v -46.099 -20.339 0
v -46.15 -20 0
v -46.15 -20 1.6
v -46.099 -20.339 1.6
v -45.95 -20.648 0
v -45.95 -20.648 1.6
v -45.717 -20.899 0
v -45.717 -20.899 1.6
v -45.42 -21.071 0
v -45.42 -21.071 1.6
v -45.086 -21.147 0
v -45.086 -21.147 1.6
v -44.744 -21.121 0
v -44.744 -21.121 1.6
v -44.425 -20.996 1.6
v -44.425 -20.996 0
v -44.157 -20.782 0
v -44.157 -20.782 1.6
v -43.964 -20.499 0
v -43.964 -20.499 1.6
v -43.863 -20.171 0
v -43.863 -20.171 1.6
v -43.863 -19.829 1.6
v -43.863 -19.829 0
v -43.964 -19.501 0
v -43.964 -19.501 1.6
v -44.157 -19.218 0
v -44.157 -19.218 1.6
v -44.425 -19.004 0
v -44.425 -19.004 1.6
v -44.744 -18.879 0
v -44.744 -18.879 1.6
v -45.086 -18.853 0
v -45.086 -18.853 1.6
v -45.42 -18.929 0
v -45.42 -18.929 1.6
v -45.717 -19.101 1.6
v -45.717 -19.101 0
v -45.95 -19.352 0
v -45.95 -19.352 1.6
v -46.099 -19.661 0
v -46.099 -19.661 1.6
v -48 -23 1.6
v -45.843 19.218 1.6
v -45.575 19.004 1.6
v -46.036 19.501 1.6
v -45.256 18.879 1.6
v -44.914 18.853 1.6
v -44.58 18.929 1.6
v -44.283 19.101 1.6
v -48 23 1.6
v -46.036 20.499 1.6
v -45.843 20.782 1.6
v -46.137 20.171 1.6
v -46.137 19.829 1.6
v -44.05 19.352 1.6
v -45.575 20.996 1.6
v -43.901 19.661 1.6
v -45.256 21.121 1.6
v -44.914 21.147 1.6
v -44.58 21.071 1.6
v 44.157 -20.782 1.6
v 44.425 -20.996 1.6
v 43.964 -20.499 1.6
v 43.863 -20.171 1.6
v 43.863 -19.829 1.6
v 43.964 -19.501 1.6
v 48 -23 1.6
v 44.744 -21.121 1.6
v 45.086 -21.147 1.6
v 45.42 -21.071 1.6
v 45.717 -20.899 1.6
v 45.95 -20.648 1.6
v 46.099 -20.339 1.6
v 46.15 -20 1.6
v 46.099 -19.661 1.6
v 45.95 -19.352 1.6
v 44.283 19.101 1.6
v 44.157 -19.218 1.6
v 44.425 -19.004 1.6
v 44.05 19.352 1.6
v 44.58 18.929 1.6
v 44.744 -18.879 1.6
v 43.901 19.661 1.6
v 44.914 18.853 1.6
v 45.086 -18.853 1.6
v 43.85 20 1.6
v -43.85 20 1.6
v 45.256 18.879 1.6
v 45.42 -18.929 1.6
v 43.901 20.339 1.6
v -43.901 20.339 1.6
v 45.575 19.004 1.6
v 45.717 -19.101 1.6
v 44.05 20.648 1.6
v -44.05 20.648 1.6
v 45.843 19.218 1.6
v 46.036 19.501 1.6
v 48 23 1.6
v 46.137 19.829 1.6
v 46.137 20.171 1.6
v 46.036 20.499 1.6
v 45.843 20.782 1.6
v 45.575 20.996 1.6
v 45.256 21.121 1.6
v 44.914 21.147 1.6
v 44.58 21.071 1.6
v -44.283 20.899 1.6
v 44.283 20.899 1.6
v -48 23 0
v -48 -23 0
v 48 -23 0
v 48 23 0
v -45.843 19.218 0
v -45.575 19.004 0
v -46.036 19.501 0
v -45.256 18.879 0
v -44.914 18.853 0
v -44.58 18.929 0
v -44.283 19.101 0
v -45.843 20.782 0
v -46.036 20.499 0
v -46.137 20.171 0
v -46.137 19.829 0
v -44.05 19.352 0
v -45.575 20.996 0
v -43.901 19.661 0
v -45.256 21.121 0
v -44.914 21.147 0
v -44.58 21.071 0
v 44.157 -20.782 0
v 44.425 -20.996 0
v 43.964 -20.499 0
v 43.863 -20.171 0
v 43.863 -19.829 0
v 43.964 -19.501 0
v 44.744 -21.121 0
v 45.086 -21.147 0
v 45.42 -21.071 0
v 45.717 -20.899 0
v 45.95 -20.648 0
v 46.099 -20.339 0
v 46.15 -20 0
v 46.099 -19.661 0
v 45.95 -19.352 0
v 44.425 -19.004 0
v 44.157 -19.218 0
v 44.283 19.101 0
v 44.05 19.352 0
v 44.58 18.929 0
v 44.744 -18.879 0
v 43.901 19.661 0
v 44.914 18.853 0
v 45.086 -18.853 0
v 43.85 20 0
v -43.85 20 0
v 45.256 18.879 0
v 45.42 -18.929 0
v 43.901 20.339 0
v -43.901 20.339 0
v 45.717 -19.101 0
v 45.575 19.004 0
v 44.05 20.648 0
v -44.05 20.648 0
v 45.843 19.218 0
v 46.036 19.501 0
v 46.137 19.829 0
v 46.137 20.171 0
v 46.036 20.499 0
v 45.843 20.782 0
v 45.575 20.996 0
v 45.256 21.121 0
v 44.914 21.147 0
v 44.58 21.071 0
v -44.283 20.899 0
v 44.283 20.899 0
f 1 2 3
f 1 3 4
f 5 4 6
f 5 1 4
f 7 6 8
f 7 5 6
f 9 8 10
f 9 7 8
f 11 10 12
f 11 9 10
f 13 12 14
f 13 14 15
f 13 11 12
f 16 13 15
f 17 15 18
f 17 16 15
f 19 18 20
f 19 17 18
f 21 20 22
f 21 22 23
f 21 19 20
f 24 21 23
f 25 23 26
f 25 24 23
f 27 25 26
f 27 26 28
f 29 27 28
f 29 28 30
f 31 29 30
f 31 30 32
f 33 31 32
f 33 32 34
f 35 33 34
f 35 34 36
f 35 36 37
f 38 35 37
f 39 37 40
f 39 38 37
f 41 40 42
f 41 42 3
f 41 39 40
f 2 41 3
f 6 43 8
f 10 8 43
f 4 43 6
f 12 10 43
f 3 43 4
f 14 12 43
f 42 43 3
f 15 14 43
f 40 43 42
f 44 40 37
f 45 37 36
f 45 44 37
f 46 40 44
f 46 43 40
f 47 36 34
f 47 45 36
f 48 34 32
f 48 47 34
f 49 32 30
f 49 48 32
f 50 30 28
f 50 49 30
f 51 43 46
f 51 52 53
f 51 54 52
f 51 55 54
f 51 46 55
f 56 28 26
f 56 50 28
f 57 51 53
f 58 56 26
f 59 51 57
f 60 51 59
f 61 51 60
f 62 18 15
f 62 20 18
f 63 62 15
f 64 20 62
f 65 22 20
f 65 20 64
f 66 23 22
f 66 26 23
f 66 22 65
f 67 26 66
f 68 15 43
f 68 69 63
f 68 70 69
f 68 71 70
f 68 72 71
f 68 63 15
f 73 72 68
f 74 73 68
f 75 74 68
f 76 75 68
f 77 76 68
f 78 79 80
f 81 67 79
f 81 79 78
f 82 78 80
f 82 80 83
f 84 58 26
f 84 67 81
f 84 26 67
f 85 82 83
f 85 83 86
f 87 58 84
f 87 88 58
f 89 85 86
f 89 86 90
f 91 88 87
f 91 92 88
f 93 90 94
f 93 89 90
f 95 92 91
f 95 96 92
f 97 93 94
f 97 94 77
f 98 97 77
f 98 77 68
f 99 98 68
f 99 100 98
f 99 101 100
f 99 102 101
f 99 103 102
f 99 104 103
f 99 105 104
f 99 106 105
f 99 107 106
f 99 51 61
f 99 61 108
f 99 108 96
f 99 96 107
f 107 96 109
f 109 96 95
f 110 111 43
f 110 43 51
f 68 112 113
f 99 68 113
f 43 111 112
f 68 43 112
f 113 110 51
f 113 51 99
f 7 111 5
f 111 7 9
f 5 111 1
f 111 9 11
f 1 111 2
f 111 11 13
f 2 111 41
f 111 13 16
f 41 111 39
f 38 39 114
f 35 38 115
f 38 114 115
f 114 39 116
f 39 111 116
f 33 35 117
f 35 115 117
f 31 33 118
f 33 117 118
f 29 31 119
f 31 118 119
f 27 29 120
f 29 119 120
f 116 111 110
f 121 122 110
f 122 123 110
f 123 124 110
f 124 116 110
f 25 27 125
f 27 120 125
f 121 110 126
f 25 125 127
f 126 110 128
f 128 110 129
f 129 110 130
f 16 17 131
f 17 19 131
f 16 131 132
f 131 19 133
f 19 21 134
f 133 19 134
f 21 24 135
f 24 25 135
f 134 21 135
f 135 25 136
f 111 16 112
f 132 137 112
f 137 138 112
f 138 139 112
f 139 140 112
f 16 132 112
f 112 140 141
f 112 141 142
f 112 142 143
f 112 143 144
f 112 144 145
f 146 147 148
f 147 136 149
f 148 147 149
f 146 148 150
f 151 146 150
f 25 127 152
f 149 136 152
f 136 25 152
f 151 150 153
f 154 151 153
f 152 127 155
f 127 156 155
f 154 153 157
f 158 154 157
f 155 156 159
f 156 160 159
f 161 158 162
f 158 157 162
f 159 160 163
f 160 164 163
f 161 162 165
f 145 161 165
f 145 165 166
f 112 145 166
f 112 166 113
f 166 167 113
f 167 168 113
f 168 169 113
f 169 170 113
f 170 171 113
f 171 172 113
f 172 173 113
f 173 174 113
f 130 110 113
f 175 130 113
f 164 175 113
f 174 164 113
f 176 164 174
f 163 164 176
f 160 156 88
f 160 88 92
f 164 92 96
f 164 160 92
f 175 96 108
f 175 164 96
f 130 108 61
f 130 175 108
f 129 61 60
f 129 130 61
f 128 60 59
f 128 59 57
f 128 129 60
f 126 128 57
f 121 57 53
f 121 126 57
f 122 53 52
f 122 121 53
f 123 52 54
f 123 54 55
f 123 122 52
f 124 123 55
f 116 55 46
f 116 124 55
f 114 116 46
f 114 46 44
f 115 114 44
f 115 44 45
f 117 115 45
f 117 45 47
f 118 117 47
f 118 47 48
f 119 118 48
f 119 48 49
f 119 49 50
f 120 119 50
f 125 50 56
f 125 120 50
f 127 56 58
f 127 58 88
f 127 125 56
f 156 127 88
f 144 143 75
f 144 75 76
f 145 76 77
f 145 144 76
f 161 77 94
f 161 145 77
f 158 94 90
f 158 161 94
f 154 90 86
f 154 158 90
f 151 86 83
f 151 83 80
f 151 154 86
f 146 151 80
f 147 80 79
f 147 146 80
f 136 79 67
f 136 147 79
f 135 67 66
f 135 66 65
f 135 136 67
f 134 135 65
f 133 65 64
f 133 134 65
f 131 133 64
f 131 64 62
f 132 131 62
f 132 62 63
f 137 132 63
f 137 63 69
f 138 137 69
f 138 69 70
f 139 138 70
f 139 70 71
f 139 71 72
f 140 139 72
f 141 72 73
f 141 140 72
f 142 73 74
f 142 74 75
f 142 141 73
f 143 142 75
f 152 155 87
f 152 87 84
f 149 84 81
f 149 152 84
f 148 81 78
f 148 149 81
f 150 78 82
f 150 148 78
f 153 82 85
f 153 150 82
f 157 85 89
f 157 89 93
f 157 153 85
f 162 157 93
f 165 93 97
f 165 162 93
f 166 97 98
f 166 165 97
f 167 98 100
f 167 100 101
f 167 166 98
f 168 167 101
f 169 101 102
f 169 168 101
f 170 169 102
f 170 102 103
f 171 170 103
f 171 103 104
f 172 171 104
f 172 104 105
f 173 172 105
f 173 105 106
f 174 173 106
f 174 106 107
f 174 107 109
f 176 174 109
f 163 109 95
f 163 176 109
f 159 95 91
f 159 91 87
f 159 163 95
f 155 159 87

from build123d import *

# Parameters (mm, degrees)
ESQUISSE1_W        = 96
ESQUISSE1_H        = 46
ESQUISSE1_R        = 1.15
BOSS_EXTRU_1_DEPTH = 1.6


with BuildPart() as part:
    # Esquisse1 → Boss.-Extru.1 (new body)
    with BuildSketch(Plane.XY):
        Rectangle(ESQUISSE1_W, ESQUISSE1_H)
        with Locations((-45, 20)):
            Circle(ESQUISSE1_R, mode=Mode.SUBTRACT)
        with Locations(Location((45, 20, 0), (0, 0, 180))):
            Circle(ESQUISSE1_R, mode=Mode.SUBTRACT)
        with Locations(Location((-45, -20, 0), (0, 0, 180))):
            Circle(ESQUISSE1_R, mode=Mode.SUBTRACT)
        with Locations((45, -20)):
            Circle(ESQUISSE1_R, mode=Mode.SUBTRACT)
    extrude(amount=BOSS_EXTRU_1_DEPTH)


solid = part.part
